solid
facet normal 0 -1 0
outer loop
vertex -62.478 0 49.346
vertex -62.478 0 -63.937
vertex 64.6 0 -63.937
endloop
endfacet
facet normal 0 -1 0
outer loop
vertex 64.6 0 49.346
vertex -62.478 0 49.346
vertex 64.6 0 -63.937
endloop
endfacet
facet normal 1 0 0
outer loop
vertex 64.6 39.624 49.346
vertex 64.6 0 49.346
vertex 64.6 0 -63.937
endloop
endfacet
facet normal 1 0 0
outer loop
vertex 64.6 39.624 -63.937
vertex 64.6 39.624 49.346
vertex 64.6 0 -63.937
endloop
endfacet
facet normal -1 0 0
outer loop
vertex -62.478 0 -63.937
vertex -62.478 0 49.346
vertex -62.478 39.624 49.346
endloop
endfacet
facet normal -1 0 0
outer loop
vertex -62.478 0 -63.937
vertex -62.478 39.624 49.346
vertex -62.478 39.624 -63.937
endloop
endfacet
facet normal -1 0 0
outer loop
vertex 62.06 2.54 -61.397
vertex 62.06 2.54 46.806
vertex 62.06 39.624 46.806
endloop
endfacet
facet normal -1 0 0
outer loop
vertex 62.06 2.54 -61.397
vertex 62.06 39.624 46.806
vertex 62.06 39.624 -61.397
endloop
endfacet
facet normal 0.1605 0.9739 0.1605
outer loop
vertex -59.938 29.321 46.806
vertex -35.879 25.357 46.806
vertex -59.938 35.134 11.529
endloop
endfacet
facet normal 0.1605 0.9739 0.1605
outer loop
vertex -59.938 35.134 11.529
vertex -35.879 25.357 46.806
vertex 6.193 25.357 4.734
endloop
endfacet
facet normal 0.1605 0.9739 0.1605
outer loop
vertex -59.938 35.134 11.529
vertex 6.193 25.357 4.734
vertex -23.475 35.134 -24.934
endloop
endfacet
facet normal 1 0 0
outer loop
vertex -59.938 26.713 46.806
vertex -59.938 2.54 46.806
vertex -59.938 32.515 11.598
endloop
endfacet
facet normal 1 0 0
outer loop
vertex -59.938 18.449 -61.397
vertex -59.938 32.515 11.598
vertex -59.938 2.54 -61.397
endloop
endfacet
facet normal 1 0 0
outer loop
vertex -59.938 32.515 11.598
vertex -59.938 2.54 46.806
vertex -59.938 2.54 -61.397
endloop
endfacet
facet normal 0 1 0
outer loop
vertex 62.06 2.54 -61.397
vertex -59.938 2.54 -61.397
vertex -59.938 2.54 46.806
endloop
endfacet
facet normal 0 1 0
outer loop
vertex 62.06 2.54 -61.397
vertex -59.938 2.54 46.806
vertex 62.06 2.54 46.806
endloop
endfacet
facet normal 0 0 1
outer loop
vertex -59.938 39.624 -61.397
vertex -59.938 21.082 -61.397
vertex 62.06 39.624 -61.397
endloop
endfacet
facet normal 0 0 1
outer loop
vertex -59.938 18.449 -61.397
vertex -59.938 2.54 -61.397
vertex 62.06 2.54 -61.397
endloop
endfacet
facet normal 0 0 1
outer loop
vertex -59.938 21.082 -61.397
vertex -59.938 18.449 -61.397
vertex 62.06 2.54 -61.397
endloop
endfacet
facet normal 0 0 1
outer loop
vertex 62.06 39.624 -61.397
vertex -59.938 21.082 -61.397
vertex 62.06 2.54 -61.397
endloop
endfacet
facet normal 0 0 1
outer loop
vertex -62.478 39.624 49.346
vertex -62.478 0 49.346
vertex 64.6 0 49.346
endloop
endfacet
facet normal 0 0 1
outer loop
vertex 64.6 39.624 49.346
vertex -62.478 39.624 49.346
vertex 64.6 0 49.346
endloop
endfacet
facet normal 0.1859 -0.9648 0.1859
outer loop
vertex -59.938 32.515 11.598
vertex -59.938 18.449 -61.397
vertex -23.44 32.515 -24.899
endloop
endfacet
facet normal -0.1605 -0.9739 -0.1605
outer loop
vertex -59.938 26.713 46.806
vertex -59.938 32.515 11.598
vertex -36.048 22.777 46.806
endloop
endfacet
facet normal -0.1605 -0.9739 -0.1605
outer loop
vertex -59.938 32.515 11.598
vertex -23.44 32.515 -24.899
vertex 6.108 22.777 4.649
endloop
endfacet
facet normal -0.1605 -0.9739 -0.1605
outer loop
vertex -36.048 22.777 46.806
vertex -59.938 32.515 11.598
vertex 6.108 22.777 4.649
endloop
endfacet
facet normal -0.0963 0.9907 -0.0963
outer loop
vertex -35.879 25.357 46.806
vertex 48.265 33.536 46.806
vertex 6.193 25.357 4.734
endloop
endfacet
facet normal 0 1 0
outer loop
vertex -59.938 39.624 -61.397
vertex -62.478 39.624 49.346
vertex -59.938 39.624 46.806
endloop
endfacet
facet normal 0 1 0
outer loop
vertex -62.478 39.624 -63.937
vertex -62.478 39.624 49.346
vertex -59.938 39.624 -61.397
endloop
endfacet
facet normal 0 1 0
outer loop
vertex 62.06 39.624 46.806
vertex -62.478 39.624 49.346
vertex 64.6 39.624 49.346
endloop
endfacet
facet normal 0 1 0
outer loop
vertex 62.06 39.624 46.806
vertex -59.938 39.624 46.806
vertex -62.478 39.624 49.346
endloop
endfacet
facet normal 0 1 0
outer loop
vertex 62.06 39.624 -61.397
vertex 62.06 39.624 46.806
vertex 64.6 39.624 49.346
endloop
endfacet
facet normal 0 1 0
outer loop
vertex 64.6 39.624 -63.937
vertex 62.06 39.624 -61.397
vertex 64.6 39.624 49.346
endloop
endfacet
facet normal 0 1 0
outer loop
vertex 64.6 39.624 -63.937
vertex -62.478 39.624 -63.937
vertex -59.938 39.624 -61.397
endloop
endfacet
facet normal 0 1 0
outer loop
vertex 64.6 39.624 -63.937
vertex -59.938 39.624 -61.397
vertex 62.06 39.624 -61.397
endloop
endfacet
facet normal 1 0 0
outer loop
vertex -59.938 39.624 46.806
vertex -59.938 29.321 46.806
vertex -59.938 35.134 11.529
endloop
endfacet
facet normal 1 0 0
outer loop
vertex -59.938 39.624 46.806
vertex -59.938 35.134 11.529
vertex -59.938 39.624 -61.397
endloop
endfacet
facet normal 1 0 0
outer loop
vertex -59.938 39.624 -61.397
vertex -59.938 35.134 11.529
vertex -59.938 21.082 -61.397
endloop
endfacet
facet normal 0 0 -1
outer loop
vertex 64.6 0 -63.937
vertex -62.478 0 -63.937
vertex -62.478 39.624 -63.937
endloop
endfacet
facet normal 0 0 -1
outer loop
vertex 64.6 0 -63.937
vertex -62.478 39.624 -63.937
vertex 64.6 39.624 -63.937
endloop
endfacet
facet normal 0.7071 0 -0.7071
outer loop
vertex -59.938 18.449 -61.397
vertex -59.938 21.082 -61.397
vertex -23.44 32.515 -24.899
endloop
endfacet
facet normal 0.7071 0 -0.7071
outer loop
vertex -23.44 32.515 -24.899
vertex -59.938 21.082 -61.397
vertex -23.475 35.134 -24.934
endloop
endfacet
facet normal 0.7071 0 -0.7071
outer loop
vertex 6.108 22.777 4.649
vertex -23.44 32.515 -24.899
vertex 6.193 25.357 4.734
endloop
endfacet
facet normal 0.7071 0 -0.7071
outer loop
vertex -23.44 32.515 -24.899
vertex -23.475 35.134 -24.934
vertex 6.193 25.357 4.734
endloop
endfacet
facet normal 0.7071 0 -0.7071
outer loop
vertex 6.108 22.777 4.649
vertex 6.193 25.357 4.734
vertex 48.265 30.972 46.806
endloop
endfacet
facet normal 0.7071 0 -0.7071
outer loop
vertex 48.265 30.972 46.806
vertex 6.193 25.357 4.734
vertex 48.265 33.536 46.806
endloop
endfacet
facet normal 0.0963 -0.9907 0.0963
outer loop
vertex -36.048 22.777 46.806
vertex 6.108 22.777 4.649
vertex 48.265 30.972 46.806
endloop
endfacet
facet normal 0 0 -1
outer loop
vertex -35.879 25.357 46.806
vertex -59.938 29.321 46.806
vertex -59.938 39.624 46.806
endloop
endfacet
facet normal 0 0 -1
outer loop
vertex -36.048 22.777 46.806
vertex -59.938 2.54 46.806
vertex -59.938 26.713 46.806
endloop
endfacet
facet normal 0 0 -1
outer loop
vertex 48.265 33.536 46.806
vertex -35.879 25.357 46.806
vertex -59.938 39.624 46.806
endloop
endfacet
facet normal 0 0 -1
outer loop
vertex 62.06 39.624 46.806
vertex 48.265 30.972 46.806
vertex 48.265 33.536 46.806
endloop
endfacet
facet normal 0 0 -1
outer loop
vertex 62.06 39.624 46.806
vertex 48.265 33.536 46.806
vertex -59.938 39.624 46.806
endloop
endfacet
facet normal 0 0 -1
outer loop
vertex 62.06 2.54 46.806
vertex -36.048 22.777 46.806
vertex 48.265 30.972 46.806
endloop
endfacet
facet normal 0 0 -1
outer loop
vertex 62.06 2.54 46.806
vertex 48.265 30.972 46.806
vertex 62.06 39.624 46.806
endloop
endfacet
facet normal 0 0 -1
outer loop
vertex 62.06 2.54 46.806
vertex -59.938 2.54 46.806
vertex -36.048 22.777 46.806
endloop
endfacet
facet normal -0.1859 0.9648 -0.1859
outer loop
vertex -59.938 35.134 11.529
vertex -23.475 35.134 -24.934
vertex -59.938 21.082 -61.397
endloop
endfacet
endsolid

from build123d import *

# Parameters (mm, degrees)
SKETCH1_W                  = 127.078191072
SKETCH1_H                  = 113.282646321
BOSS_EXTRUDE1_DEPTH        = 39.624
SHELL_1_T                  = -2.54
OFFICIAL_RIB_BLOCK20_REACH = 100.208


with BuildPart() as part:
    # Sketch1 → Boss-Extrude1 (new body)
    with BuildSketch(Plane(origin=(0, 0, 0), x_dir=(1, 0, 0), z_dir=(0, 1, 0))):
        with Locations((1.06119575, 7.295720781)):
            Rectangle(SKETCH1_W, SKETCH1_H)
    extrude(amount=BOSS_EXTRUDE1_DEPTH)

    # 抽壳1
    shell_1_openings = [part.faces().sort_by_distance(p)[0] for p in [
        (1.06119575, 39.624, -7.295720782),
    ]]
    offset(amount=SHELL_1_T, openings=shell_1_openings, kind=Kind.INTERSECTION)

    # 草图1 walls → official_rib_block20 (add, up to next)
    with BuildSketch(Plane(origin=(0.729572078, 0, -0.729572078), x_dir=(0.7071067811865477, 0, 0.7071067811865475), z_dir=(-0.7071067811865475, 0, 0.7071067811865477)), mode=Mode.PRIVATE) as official_rib_block20_sk1:
        Polygon((-180.846538696, -7.451602251), (-34.181409887, 32.514624019), (7.60678752, 22.77672703), (210.143173935, 50.617967106), (209.797270961, 53.134303954), (7.726, 25.357), (-34.23, 35.134), (-181.514338156, -5.000960726), align=None)
    official_rib_block20_tool1 = extrude(official_rib_block20_sk1.sketch, amount=OFFICIAL_RIB_BLOCK20_REACH, mode=Mode.PRIVATE) - part.part
    add(official_rib_block20_tool1.solids().sort_by_distance((-8.641006986, 30.2455, -10.100151142))[0])


solid = part.part
